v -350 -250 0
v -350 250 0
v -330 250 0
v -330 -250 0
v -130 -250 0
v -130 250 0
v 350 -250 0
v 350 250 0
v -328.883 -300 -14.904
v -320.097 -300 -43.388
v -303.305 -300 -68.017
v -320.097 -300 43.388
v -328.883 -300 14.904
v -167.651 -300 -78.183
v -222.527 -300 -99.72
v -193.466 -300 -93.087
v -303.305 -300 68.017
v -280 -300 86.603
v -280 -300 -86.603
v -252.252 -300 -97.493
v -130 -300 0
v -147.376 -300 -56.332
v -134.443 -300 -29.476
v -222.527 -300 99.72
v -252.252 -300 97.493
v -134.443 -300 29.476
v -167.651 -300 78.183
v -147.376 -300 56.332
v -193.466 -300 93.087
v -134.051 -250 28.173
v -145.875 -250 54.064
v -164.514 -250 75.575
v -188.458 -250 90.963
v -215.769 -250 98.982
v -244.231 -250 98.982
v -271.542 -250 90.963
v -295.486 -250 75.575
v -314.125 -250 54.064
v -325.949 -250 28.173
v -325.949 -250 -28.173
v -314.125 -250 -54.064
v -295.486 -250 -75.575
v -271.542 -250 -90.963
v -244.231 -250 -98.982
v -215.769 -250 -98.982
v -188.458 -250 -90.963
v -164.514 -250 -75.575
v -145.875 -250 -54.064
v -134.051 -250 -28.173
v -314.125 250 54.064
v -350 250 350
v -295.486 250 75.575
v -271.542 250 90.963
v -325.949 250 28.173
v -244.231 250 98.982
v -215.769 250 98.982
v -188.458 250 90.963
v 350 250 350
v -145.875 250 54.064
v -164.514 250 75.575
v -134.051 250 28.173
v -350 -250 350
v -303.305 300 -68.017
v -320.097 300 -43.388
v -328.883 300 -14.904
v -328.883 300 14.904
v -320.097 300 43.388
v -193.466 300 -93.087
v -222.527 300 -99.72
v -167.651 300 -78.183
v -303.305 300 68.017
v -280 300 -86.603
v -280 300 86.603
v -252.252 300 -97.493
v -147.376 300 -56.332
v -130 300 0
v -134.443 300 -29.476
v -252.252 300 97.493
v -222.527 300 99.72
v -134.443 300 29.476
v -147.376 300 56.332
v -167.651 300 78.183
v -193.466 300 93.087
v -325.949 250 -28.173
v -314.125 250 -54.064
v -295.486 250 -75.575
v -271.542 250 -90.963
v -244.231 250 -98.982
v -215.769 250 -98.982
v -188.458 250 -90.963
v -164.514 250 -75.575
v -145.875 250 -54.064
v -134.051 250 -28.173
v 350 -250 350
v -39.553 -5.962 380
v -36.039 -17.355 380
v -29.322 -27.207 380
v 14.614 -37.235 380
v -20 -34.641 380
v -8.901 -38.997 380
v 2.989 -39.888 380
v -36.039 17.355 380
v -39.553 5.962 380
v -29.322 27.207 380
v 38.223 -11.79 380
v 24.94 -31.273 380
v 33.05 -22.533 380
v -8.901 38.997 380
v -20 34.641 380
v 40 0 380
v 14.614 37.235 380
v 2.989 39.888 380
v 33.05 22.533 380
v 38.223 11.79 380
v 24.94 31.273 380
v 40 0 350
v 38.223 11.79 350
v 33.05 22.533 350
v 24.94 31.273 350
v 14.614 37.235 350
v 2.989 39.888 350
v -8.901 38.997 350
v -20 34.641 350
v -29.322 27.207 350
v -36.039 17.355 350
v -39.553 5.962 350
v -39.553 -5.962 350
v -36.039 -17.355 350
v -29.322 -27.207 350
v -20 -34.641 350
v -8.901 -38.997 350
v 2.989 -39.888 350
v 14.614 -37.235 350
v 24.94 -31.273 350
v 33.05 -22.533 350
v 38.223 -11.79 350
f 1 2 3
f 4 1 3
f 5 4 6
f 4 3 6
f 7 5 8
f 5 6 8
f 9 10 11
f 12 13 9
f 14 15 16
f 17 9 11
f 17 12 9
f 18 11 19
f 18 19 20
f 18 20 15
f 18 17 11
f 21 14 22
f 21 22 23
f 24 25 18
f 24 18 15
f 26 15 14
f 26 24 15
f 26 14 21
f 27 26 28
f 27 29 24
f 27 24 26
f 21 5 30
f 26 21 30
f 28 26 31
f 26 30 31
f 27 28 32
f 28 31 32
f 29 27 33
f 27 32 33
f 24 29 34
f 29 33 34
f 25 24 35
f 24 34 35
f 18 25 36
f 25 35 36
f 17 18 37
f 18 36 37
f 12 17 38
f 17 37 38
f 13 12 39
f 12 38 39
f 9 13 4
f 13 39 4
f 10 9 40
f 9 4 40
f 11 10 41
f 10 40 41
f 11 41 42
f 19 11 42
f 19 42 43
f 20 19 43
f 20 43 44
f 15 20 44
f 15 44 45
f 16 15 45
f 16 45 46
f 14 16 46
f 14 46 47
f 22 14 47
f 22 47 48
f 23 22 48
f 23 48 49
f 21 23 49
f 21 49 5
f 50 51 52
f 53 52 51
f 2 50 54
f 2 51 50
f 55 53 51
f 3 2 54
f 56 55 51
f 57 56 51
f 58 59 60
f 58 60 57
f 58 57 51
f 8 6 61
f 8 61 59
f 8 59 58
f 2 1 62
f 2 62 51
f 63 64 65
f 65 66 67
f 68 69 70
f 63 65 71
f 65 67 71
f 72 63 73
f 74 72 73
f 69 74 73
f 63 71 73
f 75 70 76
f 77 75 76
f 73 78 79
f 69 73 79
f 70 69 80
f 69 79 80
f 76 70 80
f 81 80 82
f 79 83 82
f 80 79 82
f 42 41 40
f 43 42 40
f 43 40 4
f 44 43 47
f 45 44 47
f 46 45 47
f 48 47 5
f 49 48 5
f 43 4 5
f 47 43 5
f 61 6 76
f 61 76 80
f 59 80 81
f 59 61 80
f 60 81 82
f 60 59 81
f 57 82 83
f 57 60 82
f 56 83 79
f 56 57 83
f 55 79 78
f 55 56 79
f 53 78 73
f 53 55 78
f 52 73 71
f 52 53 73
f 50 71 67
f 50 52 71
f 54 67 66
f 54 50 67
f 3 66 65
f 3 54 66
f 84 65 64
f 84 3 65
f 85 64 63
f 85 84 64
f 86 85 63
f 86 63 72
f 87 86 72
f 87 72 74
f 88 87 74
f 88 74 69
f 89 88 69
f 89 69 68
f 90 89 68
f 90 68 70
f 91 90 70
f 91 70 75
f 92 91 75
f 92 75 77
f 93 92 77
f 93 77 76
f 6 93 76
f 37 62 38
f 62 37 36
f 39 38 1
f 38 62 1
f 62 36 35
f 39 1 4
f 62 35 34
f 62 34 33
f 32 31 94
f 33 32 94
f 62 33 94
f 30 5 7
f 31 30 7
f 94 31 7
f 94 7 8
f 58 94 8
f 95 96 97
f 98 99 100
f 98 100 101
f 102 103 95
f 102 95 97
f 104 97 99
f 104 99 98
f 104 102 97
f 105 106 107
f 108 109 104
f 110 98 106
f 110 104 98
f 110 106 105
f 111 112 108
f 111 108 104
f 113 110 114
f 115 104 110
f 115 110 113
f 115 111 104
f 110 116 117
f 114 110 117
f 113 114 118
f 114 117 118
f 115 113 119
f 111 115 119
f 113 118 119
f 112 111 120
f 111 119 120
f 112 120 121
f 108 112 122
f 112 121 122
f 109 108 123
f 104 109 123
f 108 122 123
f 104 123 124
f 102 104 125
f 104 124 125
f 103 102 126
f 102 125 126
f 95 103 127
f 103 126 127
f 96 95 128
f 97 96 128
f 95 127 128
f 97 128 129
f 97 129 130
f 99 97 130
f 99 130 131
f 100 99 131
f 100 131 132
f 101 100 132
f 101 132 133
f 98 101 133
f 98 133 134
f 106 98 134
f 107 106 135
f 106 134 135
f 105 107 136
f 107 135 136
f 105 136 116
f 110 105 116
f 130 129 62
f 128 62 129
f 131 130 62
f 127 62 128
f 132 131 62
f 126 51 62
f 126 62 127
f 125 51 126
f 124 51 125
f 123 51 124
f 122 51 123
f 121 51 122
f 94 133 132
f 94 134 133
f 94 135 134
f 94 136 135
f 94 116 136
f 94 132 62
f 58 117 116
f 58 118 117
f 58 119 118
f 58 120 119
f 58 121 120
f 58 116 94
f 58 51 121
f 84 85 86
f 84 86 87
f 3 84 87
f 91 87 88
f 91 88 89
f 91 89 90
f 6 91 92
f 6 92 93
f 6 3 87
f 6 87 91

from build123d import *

# Parameters (mm, degrees)
SKETCH_W     = 700
SKETCH_H     = 500
PAD_DEPTH    = 350
SKETCH001_R  = 40
PAD001_DEPTH = 30
SKETCH002_R  = 100
PAD002_DEPTH = 50


with BuildPart() as part:
    # Sketch → Pad (new body)
    with BuildSketch(Plane.XY):
        Rectangle(SKETCH_W, SKETCH_H)
    extrude(amount=PAD_DEPTH)

    # Sketch001 (on Face6 of Pad) → Pad001 (join)
    with BuildSketch(Plane.XY.offset(350)):
        Circle(SKETCH001_R)
    extrude(amount=PAD001_DEPTH)

    # Sketch002 (on Face6 of Pad001) → Pad002 (join)
    with BuildSketch(Plane.XZ.offset(250)):
        with Locations((-230, 0)):
            Circle(SKETCH002_R)
    pad002 = extrude(amount=PAD002_DEPTH)

    # Mirrored: Pad002 across XZ
    add(pad002.mirror(Plane.XZ))


solid = part.part
